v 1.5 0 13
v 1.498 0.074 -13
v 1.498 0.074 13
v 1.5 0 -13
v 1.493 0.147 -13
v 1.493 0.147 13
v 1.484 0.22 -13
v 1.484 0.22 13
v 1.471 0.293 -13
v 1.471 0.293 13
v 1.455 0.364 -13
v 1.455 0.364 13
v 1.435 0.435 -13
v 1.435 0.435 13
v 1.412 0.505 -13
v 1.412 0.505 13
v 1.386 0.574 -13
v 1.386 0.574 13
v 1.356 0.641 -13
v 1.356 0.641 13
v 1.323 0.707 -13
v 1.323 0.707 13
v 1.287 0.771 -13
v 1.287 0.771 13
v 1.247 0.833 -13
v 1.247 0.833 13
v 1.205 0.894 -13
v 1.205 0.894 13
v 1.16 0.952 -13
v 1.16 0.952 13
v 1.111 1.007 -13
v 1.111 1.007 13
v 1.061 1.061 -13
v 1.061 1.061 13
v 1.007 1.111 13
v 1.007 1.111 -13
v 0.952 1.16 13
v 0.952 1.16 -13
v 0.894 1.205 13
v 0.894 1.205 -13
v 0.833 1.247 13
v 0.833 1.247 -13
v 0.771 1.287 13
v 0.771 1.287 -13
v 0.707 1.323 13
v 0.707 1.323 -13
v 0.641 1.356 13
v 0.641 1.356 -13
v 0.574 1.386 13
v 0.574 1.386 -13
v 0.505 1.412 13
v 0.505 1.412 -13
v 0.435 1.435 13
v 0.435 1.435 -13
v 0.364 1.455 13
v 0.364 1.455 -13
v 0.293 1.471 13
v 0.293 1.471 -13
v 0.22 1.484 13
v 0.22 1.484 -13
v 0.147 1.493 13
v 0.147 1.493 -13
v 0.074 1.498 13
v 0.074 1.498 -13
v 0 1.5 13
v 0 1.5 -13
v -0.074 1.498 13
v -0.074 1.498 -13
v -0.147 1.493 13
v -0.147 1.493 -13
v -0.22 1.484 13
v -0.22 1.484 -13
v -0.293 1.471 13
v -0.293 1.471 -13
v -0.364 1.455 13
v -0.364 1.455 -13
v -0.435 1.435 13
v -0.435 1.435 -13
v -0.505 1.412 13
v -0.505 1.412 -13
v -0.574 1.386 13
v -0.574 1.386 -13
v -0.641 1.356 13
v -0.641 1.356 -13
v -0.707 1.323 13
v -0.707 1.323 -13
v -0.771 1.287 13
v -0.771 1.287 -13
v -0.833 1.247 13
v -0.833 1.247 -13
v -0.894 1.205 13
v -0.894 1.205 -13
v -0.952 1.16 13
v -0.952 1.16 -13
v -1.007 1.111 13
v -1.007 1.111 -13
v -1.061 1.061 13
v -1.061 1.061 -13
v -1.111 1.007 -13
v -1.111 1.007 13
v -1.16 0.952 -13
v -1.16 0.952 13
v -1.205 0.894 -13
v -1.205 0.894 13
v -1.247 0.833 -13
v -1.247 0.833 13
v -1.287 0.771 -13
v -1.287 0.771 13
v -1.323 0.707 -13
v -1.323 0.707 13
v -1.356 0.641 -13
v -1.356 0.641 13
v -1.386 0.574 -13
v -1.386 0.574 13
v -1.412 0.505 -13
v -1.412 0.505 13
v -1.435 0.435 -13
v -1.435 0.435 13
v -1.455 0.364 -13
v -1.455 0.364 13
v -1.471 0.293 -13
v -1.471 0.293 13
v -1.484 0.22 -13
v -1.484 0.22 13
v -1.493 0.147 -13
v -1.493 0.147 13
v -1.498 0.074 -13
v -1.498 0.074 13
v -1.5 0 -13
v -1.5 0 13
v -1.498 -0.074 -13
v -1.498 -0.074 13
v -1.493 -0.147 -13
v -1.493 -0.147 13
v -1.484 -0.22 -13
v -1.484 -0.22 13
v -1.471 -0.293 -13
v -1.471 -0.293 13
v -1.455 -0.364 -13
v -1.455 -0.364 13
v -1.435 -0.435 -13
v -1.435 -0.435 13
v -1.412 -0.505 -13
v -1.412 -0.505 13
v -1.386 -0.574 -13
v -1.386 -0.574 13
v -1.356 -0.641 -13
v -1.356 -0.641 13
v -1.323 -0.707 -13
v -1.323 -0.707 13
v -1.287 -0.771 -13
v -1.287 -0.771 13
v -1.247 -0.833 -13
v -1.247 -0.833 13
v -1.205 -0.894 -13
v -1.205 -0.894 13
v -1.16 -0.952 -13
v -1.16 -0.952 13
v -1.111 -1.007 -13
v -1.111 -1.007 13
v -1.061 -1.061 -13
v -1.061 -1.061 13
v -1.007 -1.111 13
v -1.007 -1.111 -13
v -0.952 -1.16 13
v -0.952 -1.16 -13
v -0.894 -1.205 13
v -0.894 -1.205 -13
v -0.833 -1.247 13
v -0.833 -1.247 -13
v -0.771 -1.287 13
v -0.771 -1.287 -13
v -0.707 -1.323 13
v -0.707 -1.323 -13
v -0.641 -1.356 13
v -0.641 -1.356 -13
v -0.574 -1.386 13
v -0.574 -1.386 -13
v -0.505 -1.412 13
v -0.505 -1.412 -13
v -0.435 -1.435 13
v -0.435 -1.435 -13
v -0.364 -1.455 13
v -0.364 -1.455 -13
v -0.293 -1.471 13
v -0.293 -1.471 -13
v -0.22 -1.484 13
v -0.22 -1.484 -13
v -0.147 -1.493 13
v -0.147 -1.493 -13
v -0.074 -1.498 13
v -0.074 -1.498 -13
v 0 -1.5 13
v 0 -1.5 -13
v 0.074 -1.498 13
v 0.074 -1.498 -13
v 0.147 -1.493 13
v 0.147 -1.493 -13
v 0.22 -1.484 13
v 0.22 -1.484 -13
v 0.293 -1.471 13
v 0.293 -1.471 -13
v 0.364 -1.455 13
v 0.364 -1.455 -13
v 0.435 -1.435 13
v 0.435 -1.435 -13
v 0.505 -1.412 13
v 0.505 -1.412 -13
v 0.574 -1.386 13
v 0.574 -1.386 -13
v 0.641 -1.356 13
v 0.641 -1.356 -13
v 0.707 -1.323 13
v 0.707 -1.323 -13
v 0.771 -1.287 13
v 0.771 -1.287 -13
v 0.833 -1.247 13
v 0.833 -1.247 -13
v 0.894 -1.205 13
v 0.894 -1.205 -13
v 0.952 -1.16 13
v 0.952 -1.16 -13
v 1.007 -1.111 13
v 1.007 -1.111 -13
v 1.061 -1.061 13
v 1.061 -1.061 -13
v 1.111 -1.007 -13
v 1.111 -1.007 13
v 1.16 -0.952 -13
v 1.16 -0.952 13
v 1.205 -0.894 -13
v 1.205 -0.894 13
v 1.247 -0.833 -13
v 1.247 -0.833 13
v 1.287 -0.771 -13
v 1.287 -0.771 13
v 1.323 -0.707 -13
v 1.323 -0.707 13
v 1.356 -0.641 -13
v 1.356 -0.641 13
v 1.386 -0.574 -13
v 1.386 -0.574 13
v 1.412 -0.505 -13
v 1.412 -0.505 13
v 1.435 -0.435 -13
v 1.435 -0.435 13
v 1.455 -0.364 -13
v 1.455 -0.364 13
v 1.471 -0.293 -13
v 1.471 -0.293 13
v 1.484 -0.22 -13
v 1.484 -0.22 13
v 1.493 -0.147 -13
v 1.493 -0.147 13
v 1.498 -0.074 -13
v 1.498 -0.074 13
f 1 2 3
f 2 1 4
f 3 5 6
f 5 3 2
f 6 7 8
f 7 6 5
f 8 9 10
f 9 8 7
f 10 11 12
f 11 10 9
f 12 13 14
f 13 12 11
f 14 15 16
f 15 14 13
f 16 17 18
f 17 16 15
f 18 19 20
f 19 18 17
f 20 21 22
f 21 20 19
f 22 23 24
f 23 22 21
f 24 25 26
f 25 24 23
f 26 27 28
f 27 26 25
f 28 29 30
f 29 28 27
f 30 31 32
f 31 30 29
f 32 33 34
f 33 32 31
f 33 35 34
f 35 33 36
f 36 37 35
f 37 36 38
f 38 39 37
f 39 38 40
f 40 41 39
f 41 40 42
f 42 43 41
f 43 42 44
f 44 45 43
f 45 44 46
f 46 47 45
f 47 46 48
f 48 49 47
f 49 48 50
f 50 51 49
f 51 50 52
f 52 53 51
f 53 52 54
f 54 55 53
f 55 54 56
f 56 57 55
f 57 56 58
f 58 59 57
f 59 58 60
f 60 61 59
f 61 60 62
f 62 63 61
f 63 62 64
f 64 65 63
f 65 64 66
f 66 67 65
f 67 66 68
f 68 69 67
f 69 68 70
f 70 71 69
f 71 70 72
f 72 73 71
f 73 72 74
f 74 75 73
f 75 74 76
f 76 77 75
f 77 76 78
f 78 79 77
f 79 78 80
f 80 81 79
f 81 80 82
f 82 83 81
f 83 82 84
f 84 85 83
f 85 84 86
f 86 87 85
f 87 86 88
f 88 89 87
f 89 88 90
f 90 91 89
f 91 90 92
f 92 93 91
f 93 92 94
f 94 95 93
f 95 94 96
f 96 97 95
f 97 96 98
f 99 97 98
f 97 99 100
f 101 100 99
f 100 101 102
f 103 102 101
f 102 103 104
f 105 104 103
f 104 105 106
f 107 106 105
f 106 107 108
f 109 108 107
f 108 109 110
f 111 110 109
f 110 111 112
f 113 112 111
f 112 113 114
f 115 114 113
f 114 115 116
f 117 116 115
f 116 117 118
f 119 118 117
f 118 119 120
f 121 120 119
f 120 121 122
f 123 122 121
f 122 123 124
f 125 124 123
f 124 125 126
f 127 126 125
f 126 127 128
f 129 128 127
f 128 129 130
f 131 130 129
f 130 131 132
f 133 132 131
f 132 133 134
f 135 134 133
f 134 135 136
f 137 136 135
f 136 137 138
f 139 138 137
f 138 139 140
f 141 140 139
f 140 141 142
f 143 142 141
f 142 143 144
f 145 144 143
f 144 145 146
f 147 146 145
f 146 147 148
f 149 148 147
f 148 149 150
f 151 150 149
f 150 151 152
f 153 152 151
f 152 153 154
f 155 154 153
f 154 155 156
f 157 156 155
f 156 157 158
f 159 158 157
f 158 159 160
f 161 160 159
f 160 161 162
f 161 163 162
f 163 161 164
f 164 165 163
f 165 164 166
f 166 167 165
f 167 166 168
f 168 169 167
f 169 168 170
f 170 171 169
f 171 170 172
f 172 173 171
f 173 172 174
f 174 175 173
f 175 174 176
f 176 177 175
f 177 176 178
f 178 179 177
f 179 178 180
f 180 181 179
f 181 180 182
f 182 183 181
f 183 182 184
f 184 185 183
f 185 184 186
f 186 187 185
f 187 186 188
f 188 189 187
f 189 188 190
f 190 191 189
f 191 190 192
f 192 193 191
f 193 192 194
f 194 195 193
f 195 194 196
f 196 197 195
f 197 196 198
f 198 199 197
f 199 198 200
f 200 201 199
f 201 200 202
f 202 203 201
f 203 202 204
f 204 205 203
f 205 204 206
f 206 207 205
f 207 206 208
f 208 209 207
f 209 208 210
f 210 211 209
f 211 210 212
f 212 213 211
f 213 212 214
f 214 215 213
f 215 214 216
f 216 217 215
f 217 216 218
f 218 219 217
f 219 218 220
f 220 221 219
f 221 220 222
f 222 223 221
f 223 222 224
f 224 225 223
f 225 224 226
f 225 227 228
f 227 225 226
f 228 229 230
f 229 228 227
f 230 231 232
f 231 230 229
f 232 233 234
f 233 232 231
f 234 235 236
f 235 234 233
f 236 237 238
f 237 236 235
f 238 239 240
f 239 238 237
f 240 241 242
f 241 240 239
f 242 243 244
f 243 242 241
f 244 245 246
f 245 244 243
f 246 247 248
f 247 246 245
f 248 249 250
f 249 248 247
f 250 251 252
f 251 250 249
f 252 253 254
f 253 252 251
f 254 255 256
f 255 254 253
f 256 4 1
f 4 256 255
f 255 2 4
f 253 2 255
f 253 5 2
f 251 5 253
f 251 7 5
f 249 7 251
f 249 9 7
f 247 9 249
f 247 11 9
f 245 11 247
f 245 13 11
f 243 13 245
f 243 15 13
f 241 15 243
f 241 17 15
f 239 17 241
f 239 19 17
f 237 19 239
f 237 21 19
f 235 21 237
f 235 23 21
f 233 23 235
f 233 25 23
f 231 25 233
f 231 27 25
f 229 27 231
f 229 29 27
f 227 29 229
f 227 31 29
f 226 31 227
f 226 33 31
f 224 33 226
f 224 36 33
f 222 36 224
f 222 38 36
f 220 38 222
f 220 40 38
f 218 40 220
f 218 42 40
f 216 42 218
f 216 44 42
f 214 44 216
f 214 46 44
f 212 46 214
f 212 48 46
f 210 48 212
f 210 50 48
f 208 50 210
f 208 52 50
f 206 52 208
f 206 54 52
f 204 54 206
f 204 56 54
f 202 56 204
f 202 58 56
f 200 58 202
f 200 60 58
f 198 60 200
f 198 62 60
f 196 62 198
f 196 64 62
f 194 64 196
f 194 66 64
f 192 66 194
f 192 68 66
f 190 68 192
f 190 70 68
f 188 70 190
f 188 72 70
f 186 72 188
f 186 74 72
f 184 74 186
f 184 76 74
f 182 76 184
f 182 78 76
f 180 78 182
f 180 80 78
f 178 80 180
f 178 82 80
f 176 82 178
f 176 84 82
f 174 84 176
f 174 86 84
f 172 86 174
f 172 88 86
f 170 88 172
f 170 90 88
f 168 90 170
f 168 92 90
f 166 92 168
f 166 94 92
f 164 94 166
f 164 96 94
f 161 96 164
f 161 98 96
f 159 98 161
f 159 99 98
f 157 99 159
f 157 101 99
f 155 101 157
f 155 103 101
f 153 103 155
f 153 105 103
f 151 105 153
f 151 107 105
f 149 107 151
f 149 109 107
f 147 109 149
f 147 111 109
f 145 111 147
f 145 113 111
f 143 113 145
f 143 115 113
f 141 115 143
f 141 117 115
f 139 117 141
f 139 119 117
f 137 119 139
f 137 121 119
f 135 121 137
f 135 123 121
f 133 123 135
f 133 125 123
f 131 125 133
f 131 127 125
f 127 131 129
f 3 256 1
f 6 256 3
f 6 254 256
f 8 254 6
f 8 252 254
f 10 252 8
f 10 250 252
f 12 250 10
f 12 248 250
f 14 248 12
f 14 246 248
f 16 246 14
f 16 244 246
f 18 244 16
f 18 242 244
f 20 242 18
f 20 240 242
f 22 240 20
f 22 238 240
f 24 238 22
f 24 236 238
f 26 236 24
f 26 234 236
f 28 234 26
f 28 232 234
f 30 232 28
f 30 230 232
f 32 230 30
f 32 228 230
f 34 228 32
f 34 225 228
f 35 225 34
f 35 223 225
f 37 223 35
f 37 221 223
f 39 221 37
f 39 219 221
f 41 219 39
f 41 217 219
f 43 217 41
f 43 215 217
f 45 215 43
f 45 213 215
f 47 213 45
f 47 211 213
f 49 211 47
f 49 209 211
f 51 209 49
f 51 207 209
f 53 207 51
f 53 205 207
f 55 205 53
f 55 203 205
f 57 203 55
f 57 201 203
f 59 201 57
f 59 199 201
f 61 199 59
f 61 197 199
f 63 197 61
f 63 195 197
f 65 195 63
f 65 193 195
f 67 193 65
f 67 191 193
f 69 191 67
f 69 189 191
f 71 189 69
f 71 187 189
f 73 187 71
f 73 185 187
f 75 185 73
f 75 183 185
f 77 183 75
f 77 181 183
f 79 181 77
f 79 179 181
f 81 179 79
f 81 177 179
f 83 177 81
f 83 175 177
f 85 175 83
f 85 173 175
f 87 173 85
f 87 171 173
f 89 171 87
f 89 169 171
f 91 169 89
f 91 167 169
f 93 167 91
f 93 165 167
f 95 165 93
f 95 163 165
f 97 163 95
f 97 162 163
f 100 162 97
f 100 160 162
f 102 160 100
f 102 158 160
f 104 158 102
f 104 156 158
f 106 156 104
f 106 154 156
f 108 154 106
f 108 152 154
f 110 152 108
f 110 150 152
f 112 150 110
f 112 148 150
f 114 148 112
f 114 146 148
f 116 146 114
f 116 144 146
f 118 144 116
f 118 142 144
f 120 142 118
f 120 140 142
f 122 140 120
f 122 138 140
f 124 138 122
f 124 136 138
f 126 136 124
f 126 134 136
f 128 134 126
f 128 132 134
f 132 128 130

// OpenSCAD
$fn=128;

module rod(d=3, h=26){
    cylinder(d=d, h=h, center=true);
}

rod(d=3.0, h=26.0);
